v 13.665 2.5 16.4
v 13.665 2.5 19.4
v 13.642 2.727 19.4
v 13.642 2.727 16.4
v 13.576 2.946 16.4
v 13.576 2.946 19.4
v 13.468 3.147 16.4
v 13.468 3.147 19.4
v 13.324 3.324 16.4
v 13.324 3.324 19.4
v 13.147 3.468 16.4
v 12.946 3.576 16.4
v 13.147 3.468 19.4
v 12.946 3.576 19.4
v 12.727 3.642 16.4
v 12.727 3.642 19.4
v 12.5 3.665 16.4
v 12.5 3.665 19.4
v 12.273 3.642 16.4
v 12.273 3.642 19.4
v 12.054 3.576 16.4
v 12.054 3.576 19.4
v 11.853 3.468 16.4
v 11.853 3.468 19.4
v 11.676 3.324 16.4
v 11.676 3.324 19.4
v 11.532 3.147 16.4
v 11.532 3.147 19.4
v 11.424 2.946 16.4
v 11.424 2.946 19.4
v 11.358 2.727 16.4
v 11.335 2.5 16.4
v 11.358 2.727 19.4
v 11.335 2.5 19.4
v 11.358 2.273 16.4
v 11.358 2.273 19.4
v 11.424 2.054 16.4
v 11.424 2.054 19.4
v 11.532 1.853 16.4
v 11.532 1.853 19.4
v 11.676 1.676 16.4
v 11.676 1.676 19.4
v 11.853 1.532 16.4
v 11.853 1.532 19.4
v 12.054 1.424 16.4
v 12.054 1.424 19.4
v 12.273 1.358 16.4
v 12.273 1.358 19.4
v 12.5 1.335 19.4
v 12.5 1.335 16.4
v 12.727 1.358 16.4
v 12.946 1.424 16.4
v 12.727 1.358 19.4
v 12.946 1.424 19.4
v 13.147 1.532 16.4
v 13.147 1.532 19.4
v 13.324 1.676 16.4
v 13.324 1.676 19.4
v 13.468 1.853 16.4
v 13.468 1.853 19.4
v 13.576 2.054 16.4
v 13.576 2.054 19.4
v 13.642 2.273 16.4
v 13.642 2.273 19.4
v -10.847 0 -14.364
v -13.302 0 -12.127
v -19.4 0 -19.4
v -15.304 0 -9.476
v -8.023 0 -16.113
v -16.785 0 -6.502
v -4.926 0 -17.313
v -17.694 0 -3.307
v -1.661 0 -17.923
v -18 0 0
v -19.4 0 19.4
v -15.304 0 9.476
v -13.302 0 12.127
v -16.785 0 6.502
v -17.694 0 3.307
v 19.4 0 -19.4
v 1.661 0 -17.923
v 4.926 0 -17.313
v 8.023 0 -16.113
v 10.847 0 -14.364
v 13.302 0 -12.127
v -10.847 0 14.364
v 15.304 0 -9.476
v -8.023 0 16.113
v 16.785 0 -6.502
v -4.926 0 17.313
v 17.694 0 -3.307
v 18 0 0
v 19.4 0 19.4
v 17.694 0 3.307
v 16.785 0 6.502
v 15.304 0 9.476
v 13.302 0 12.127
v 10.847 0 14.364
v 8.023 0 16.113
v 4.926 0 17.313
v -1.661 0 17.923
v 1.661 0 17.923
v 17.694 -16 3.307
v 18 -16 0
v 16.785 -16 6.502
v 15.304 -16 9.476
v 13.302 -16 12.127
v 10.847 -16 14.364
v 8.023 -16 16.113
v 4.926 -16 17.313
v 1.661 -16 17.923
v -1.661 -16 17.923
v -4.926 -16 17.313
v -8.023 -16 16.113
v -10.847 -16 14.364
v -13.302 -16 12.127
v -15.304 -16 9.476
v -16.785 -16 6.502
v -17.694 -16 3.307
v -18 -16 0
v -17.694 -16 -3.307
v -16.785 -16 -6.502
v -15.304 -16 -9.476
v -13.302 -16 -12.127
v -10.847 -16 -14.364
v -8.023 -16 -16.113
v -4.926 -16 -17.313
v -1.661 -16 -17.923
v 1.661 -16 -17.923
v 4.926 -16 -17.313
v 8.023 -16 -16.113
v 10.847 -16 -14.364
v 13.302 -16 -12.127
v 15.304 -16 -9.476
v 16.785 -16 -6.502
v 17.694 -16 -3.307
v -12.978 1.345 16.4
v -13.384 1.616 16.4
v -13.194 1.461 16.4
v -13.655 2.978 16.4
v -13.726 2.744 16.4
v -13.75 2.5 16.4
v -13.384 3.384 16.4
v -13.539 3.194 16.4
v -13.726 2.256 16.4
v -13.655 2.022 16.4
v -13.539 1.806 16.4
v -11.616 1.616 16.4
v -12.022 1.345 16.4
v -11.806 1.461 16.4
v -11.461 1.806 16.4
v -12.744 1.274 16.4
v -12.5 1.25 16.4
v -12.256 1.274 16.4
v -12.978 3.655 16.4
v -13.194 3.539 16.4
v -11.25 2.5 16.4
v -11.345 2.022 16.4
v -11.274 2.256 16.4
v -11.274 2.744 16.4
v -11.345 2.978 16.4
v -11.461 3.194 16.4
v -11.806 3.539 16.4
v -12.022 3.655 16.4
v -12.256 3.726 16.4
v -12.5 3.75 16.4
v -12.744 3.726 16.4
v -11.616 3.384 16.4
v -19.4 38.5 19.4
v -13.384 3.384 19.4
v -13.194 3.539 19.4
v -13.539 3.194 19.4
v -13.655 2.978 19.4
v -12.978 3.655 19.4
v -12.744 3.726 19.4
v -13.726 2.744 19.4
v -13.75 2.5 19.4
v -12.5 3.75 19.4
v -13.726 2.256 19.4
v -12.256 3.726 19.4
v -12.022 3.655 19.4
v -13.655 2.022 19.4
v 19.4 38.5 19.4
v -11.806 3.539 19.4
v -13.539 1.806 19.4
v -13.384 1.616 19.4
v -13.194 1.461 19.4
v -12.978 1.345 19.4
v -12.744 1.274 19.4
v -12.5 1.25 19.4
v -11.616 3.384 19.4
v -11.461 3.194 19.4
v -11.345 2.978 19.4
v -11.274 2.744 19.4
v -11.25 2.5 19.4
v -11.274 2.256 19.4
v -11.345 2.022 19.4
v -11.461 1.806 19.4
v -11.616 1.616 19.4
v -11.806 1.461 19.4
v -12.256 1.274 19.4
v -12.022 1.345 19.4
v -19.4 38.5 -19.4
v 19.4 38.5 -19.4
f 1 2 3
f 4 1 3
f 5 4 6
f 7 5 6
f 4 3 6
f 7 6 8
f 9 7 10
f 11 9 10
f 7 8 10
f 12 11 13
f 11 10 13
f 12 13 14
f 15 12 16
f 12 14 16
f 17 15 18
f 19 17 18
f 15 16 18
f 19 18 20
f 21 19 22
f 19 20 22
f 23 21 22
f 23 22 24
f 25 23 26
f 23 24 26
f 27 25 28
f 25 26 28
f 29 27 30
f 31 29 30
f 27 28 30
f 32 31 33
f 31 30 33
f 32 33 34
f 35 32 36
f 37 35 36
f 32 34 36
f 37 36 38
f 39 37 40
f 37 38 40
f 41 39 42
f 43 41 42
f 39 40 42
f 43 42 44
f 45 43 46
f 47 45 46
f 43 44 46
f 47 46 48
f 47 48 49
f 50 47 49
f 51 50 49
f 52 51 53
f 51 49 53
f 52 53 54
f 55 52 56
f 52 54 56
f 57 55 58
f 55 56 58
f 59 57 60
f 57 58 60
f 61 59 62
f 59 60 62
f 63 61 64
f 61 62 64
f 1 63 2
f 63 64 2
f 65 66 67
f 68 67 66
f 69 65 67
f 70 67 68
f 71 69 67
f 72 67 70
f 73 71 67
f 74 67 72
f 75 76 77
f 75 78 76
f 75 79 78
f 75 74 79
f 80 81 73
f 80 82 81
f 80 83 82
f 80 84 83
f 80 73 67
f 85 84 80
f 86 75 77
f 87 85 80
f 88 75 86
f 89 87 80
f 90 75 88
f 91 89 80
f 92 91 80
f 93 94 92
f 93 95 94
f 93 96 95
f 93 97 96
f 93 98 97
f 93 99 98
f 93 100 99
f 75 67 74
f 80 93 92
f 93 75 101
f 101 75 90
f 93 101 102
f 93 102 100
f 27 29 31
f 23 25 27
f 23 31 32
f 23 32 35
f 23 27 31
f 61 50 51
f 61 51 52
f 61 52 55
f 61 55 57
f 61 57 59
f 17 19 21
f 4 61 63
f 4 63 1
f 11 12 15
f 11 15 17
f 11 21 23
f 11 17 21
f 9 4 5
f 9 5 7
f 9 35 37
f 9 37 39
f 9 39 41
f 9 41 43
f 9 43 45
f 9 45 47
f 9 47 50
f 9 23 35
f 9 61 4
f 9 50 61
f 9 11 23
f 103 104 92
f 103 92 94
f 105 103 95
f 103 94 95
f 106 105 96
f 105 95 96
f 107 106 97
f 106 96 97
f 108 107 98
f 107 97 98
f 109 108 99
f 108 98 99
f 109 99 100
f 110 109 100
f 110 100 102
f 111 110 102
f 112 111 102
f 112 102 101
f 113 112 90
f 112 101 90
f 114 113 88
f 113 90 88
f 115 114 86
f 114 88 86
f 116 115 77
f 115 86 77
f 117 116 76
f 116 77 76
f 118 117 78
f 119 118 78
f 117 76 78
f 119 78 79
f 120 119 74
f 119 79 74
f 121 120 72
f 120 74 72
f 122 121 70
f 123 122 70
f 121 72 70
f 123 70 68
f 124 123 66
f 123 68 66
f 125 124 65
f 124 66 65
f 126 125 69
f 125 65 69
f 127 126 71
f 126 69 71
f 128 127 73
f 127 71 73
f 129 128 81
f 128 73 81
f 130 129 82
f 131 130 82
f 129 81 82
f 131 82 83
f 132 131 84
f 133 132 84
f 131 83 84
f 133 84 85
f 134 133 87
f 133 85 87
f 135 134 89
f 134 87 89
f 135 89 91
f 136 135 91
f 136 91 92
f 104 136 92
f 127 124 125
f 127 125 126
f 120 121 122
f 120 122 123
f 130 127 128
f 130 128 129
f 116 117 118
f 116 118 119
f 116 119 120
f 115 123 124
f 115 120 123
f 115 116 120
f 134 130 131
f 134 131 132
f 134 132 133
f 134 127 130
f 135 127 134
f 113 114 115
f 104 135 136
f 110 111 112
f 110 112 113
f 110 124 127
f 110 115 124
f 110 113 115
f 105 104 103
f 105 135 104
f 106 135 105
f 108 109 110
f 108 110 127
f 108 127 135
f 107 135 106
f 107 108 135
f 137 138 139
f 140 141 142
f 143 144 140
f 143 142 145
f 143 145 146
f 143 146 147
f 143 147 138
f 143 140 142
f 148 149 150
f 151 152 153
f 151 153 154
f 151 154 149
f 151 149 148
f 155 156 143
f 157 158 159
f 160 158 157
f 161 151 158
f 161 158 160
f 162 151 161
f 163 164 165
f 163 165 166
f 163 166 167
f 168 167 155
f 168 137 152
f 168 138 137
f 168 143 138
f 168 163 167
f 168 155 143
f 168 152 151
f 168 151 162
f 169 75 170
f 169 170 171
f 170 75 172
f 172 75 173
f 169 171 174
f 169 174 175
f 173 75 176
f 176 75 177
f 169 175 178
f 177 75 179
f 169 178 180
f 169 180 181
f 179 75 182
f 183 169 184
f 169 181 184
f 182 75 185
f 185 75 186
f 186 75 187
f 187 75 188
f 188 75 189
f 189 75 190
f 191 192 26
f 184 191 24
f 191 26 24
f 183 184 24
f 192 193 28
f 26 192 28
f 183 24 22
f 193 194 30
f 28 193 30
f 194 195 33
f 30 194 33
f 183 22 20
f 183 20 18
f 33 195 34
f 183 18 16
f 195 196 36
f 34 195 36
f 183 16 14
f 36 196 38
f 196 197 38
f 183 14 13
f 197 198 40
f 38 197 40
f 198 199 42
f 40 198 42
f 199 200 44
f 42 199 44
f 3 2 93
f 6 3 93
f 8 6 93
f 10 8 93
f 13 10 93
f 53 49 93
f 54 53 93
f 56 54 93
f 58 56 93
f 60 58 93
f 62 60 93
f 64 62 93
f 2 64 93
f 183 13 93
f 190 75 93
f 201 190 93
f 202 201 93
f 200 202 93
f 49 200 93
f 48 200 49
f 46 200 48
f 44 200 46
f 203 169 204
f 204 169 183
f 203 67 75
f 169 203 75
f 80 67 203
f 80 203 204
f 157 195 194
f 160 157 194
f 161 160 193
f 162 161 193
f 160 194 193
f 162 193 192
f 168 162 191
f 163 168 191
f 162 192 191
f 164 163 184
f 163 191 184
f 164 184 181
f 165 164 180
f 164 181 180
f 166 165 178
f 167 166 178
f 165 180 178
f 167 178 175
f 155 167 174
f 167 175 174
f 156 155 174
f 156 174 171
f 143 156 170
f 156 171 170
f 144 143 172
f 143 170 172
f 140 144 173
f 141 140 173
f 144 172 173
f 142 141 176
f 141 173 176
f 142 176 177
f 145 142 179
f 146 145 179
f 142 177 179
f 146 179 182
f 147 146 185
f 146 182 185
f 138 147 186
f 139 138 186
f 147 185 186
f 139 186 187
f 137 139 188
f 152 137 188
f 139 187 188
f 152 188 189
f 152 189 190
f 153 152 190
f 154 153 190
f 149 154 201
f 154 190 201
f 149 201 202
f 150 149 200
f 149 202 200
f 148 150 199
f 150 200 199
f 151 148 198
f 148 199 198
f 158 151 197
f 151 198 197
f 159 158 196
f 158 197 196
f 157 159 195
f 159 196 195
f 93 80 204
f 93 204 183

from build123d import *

# Parameters (mm, degrees)
F0_W     = 38.8
F0_H     = 38.8
F0_R     = 18
F1_DEPTH = 38.5
F2_DEPTH = 16
F3_R     = 1.164619
F3_R_2   = 1.25
F4_DEPTH = 3


with BuildPart() as f1:
    # F0 (on Front) → F1 (new body)
    with BuildSketch(Plane.XZ):
        Rectangle(F0_W, F0_H)
        Circle(F0_R, mode=Mode.SUBTRACT)
        Circle(F0_R)
    extrude(amount=-F1_DEPTH)

    # F0 (on Front) → F2 (join)
    with BuildSketch(Plane.XZ):
        Circle(F0_R)
    extrude(amount=F2_DEPTH)

    # F3 (on face) → F4 (cut)
    with BuildSketch(Plane.XY.offset(19.4)):
        with Locations((12.5, 2.5)):
            Circle(F3_R)
        with Locations((-12.5, 2.5)):
            Circle(F3_R_2)
    extrude(amount=-F4_DEPTH, mode=Mode.SUBTRACT)


solid = f1.part
